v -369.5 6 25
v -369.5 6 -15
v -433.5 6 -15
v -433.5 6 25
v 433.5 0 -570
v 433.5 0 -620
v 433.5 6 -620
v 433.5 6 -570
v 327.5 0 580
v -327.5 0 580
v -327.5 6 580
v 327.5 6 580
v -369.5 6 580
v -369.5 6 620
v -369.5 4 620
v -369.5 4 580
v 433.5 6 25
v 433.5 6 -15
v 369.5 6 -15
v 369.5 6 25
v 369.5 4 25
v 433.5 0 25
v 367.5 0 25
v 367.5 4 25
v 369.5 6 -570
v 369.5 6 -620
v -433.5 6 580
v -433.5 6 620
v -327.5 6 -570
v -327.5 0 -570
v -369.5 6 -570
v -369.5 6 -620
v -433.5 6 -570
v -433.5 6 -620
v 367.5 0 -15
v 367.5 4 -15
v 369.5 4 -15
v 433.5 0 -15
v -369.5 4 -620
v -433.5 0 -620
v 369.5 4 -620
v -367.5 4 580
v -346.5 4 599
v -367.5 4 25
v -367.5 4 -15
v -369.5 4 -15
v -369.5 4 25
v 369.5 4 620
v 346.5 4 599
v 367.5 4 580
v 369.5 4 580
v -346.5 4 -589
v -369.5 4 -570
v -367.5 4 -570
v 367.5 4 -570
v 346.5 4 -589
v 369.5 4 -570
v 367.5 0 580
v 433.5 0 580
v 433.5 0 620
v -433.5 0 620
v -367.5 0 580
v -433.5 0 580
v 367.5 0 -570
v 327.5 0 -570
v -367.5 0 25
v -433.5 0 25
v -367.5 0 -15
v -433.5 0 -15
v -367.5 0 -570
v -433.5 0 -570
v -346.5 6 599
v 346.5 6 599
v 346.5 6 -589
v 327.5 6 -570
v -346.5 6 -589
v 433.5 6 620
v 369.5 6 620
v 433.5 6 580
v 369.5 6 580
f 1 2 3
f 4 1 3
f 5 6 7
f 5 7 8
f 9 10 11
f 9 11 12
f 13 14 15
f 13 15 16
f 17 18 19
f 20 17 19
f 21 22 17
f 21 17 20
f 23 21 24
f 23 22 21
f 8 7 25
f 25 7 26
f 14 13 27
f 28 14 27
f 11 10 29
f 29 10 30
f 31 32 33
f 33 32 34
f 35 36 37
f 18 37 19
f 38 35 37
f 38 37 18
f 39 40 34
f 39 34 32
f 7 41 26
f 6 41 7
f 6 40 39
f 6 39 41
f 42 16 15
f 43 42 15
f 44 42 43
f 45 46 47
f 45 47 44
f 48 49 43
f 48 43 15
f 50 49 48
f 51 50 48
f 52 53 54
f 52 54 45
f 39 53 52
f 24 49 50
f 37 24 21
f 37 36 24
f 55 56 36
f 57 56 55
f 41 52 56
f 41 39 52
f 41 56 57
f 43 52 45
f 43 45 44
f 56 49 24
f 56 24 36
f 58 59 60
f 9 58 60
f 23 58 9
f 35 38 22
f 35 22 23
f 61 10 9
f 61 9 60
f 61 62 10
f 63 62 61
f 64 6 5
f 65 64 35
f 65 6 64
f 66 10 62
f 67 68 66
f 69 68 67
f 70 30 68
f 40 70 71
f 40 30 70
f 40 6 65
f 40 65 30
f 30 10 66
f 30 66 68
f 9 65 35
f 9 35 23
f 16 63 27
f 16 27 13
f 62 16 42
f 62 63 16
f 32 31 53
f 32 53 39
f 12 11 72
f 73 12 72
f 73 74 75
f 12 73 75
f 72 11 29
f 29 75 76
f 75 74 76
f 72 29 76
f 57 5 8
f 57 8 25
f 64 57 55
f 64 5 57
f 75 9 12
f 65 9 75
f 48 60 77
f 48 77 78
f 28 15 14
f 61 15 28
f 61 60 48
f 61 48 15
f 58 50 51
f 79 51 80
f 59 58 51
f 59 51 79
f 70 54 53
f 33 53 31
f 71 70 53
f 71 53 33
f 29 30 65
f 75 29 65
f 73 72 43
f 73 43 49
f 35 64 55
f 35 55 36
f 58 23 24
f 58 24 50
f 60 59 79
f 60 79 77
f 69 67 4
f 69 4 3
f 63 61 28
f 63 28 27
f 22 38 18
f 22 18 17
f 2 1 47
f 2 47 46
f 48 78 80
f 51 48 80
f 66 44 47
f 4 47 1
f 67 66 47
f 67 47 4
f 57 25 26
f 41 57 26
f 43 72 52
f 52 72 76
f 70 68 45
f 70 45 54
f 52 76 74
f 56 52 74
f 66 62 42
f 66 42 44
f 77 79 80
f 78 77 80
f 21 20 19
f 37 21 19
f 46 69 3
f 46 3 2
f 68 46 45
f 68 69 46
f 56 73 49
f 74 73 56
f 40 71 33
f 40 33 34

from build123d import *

# Parameters (mm, degrees)
SKETCH1_W           = 655
SKETCH1_H           = 1150
BOSS_EXTRUDE1_DEPTH = 6
SKETCH2_W           = 739
SKETCH2_H           = 1260
SKETCH2_W_2         = 693
SKETCH2_H_2         = 1188
CUT_EXTRUDE1_DEPTH  = 2


with BuildPart() as part:
    # Sketch1 → Boss-Extrude1 (new body)
    with BuildSketch(Plane(origin=(0, 0, 0), x_dir=(1, 0, 0), z_dir=(0, 1, 0))):
        Polygon((-433.5, 620), (433.5, 620), (433.5, 570), (367.5, 570), (367.5, 15), (433.5, 15), (433.5, -25), (367.5, -25), (367.5, -580), (433.5, -580), (433.5, -620), (-433.5, -620), (-433.5, -580), (-367.5, -580), (-367.5, -25), (-433.5, -25), (-433.5, 15), (-367.5, 15), (-367.5, 570), (-433.5, 570), align=None)
        with Locations((0, -5)):
            Rectangle(SKETCH1_W, SKETCH1_H, mode=Mode.SUBTRACT)
    extrude(amount=BOSS_EXTRUDE1_DEPTH)

    # Sketch2 → Cut-Extrude1 (cut)
    with BuildSketch(Plane(origin=(0, 6, 0), x_dir=(1, 0, 0), z_dir=(0, 1, 0))):
        Rectangle(SKETCH2_W, SKETCH2_H)
        with Locations((0, -5)):
            Rectangle(SKETCH2_W_2, SKETCH2_H_2, mode=Mode.SUBTRACT)
    extrude(amount=-CUT_EXTRUDE1_DEPTH, mode=Mode.SUBTRACT)


solid = part.part
